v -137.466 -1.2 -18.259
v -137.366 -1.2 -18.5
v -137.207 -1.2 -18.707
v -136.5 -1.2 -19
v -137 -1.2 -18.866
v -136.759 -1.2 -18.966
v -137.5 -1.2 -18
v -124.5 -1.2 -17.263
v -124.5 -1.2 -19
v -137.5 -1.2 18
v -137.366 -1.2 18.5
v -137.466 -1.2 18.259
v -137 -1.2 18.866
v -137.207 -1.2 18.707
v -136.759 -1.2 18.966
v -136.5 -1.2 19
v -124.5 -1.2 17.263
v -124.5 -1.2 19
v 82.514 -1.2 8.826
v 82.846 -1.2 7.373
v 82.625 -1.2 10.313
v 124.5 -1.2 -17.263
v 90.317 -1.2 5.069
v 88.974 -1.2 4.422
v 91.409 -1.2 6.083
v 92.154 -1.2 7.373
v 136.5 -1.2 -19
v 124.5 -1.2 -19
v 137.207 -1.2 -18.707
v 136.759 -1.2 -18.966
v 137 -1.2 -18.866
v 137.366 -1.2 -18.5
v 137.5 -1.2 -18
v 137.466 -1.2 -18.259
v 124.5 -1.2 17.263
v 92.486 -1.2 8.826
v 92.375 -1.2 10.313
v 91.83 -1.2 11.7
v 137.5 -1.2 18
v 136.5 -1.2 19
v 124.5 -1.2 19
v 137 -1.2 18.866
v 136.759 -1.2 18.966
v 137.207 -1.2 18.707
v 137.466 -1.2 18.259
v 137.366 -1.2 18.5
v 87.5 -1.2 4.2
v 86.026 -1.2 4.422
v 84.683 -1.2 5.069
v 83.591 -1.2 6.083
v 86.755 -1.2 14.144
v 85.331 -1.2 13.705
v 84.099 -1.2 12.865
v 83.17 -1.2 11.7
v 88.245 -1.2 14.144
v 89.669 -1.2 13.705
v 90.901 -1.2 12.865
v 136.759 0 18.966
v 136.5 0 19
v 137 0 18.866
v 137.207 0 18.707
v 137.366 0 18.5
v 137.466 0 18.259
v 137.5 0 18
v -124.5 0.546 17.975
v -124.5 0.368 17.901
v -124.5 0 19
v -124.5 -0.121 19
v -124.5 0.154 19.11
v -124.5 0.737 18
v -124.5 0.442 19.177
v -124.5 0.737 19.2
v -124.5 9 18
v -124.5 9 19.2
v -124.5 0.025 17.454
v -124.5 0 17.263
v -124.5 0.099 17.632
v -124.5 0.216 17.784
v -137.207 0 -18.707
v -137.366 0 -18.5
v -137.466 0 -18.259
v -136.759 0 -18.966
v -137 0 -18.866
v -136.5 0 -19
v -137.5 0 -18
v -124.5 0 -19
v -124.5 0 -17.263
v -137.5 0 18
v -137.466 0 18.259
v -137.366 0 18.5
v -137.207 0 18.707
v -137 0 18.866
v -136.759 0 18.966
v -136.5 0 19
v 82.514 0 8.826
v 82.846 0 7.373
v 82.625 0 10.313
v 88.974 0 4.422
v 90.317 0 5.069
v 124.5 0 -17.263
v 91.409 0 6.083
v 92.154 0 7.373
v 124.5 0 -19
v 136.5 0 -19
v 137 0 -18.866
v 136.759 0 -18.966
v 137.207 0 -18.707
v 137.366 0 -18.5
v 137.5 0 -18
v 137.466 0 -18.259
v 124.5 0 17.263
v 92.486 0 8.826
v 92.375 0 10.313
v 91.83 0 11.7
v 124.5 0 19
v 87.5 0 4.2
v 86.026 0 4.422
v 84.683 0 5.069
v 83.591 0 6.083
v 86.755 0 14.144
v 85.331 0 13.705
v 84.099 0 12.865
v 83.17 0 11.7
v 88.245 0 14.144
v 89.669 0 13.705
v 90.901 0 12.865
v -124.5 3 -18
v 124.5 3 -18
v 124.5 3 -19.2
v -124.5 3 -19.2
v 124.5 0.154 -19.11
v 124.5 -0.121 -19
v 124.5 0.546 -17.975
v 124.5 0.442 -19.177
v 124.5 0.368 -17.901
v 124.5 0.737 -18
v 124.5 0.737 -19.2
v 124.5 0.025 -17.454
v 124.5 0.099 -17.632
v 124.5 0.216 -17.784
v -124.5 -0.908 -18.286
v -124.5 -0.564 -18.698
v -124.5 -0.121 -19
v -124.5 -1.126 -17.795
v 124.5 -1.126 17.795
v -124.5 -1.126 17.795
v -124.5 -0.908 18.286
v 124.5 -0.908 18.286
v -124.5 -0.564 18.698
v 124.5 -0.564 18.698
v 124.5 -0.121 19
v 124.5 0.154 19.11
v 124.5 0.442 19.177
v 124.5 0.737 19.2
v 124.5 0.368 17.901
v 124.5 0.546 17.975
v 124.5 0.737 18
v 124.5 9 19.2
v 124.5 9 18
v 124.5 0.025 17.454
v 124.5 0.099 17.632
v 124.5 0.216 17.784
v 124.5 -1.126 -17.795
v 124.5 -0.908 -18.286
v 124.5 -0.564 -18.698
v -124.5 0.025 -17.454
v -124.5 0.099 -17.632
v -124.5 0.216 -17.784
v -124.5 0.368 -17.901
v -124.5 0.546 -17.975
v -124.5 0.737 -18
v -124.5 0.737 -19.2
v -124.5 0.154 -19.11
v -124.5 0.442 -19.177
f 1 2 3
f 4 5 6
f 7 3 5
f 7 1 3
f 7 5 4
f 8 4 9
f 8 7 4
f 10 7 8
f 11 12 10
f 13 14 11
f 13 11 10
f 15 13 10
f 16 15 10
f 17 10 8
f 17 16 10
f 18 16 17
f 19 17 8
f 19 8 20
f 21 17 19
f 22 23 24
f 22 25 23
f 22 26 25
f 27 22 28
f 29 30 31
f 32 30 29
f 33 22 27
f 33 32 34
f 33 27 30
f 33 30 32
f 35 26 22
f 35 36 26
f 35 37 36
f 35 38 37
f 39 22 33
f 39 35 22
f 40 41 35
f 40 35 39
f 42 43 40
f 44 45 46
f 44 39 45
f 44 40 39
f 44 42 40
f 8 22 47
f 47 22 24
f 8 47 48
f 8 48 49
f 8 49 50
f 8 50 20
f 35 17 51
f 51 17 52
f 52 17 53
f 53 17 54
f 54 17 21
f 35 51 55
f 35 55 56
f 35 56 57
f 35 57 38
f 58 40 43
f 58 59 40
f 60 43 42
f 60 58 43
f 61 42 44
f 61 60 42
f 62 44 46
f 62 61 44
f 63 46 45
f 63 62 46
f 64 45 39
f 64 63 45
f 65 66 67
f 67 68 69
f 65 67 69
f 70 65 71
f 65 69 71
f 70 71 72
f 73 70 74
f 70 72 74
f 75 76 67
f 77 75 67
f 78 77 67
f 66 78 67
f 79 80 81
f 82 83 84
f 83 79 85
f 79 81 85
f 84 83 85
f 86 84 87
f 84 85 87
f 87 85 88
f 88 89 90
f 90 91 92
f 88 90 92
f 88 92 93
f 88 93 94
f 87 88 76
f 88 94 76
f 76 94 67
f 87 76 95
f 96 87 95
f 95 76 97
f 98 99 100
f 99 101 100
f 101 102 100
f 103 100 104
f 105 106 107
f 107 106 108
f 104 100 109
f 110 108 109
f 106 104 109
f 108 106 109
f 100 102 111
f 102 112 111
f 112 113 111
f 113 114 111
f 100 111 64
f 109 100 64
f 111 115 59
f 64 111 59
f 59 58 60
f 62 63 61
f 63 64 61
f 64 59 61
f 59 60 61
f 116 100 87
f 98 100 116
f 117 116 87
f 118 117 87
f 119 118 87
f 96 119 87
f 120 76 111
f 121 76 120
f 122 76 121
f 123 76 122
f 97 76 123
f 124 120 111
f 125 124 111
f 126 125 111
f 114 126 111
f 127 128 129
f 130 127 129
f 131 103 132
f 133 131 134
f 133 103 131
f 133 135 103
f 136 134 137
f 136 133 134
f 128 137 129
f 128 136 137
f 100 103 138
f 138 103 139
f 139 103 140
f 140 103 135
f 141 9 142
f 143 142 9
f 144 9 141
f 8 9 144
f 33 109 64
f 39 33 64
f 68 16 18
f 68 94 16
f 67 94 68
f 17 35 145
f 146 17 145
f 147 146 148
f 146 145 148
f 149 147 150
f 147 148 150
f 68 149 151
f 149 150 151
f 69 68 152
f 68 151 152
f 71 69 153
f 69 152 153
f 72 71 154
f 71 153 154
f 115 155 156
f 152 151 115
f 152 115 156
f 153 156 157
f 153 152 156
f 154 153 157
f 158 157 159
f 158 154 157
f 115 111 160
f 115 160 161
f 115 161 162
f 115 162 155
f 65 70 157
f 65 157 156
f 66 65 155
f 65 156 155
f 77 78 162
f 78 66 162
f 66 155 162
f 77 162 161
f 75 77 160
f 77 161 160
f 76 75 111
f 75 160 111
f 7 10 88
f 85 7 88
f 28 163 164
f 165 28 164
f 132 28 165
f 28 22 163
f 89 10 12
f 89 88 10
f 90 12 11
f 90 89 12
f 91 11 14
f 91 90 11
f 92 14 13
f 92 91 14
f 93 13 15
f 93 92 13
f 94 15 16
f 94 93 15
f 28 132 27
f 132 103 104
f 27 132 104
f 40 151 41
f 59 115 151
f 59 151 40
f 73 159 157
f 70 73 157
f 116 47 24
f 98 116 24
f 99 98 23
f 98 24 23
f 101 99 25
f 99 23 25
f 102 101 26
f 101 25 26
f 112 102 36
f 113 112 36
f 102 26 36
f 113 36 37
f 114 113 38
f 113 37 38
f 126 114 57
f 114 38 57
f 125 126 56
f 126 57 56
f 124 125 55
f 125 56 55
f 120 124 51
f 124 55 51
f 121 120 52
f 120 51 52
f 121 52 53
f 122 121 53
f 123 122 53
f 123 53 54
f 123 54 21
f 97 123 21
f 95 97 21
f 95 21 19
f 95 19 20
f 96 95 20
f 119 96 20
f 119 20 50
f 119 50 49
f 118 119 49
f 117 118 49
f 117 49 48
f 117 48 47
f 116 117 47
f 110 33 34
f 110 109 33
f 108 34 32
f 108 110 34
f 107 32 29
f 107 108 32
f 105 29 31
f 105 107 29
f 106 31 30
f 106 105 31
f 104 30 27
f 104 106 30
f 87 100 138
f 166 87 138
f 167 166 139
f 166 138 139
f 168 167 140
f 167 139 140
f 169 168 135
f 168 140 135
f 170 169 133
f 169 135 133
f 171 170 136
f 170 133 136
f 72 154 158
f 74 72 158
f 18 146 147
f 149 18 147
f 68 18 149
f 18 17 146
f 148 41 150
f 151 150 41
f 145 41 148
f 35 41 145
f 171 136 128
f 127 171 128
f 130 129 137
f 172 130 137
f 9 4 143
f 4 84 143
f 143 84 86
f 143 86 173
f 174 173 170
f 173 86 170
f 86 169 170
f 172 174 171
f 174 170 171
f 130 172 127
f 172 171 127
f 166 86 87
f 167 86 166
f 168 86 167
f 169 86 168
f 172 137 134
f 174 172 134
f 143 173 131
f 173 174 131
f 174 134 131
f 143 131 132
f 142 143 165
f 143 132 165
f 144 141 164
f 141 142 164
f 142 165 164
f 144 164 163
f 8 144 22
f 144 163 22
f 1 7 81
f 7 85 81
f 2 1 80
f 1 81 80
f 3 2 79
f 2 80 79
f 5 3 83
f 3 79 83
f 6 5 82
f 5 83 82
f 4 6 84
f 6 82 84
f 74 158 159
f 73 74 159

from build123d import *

# Parameters (mm, degrees)
FLANGE_BASE2_DEPTH       = 137.5
CORTE_EXTRUS_O3_START    = -137.5
CORTE_EXTRUS_O3_DEPTH    = 13
CORTE_EXTRUS_O3_START_2  = 124.5
CORTE_EXTRUS_O3_2_DEPTH  = 13
ESBO_O12_W               = 13
ESBO_O12_H               = 1.2
RESSALTO_EXTRUS_O1_DEPTH = 19
FILETE1_R                = 1
ESBO_O13_R               = 5
CORTE_EXTRUS_O4_DEPTH    = 140.208225332


# Read off the part's stored shape, not the designer's step: Corte-extrusão3
# Sheet-metal steps are written as plain solids
with BuildPart() as part:
    # Esboço1 → Flange-base2 (new, symmetric)
    with BuildSketch(Plane(origin=(0, 0, 0), x_dir=(0, 0, -1), z_dir=(1, 0, 0))):
        with BuildLine():
            Line((-18, 9), (-18, 0.7366))
            ThreePointArc((-18, 0.7366), (-17.784254855, 0.215745145), (-17.2634, 0))
            Line((-17.2634, 0), (17.2634, 0))
            ThreePointArc((17.2634, 0), (17.784254855, 0.215745145), (18, 0.7366))
            Line((18, 0.7366), (18, 3))
            Line((18, 3), (19.2, 3))
            Line((19.2, 3), (19.2, 0.7366))
            ThreePointArc((19.2, 0.7366), (18.632782992, -0.632782992), (17.2634, -1.2))
            Line((17.2634, -1.2), (-17.2634, -1.2))
            ThreePointArc((-17.2634, -1.2), (-18.632782992, -0.632782992), (-19.2, 0.7366))
            Line((-19.2, 0.7366), (-19.2, 9))
            Line((-19.2, 9), (-18, 9))
        make_face()
    extrude(amount=FLANGE_BASE2_DEPTH, both=True)

    # Corte-extrusão3 outline → Corte-extrusão3 (cut)
    with BuildSketch(Plane.YZ.offset(CORTE_EXTRUS_O3_START)):
        with BuildLine():
            Line((-1.2, 17.2634), (0, 17.2634))
            ThreePointArc((0, 17.2634), (0.215745145, 17.784254855), (0.7366, 18))
            Line((0.7366, 18), (9, 18))
            Line((9, 18), (9, 19.2))
            Line((9, 19.2), (0.7366, 19.2))
            ThreePointArc((0.7366, 19.2), (-0.632782992, 18.632782992), (-1.2, 17.2634))
        make_face()
        with BuildLine():
            ThreePointArc((0.7366, -18), (0.215745145, -17.784254855), (0, -17.2634))
            Line((0, -17.2634), (-1.2, -17.2634))
            ThreePointArc((-1.2, -17.2634), (-0.632782992, -18.632782992), (0.7366, -19.2))
            Line((0.7366, -19.2), (3, -19.2))
            Line((3, -19.2), (3, -18))
            Line((3, -18), (0.7366, -18))
        make_face()
    extrude(amount=CORTE_EXTRUS_O3_DEPTH, mode=Mode.SUBTRACT)

    # Corte-extrus_o3 2 outline → Corte-extrus_o3 2 (cut)
    with BuildSketch(Plane.YZ.offset(CORTE_EXTRUS_O3_START_2)):
        with BuildLine():
            Line((-1.2, 17.2634), (0, 17.2634))
            ThreePointArc((0, 17.2634), (0.215745145, 17.784254855), (0.7366, 18))
            Line((0.7366, 18), (9, 18))
            Line((9, 18), (9, 19.2))
            Line((9, 19.2), (0.7366, 19.2))
            ThreePointArc((0.7366, 19.2), (-0.632782992, 18.632782992), (-1.2, 17.2634))
        make_face()
        with BuildLine():
            ThreePointArc((0.7366, -18), (0.215745145, -17.784254855), (0, -17.2634))
            Line((0, -17.2634), (-1.2, -17.2634))
            ThreePointArc((-1.2, -17.2634), (-0.632782992, -18.632782992), (0.7366, -19.2))
            Line((0.7366, -19.2), (3, -19.2))
            Line((3, -19.2), (3, -18))
            Line((3, -18), (0.7366, -18))
        make_face()
    extrude(amount=CORTE_EXTRUS_O3_2_DEPTH, mode=Mode.SUBTRACT)

    # Esboço12 → Ressalto-extrusão1 (add, symmetric)
    with BuildSketch(Plane.XY):
        with Locations((131, -0.6)):
            Rectangle(ESBO_O12_W, ESBO_O12_H)
        with Locations((-131, -0.6)):
            Rectangle(ESBO_O12_W, ESBO_O12_H)
    extrude(amount=RESSALTO_EXTRUS_O1_DEPTH, both=True)

    # Filete1
    filete1_edges = [part.edges().sort_by_distance(p)[0] for p in [
        (137.5, -0.6, -19),
        (137.5, -0.6, 19),
        (-137.5, -0.6, -19),
        (-137.5, -0.6, 19),
    ]]
    fillet(filete1_edges, radius=FILETE1_R)

    # Esboço13 → Corte-extrusão4 (cut, through all)
    with BuildSketch(Plane.XZ.offset(1.2)):
        with Locations(Location((87.5, 9.2, 0), (0, 0, 270))):
            Circle(ESBO_O13_R)
    extrude(amount=-CORTE_EXTRUS_O4_DEPTH, mode=Mode.SUBTRACT)


solid = part.part
